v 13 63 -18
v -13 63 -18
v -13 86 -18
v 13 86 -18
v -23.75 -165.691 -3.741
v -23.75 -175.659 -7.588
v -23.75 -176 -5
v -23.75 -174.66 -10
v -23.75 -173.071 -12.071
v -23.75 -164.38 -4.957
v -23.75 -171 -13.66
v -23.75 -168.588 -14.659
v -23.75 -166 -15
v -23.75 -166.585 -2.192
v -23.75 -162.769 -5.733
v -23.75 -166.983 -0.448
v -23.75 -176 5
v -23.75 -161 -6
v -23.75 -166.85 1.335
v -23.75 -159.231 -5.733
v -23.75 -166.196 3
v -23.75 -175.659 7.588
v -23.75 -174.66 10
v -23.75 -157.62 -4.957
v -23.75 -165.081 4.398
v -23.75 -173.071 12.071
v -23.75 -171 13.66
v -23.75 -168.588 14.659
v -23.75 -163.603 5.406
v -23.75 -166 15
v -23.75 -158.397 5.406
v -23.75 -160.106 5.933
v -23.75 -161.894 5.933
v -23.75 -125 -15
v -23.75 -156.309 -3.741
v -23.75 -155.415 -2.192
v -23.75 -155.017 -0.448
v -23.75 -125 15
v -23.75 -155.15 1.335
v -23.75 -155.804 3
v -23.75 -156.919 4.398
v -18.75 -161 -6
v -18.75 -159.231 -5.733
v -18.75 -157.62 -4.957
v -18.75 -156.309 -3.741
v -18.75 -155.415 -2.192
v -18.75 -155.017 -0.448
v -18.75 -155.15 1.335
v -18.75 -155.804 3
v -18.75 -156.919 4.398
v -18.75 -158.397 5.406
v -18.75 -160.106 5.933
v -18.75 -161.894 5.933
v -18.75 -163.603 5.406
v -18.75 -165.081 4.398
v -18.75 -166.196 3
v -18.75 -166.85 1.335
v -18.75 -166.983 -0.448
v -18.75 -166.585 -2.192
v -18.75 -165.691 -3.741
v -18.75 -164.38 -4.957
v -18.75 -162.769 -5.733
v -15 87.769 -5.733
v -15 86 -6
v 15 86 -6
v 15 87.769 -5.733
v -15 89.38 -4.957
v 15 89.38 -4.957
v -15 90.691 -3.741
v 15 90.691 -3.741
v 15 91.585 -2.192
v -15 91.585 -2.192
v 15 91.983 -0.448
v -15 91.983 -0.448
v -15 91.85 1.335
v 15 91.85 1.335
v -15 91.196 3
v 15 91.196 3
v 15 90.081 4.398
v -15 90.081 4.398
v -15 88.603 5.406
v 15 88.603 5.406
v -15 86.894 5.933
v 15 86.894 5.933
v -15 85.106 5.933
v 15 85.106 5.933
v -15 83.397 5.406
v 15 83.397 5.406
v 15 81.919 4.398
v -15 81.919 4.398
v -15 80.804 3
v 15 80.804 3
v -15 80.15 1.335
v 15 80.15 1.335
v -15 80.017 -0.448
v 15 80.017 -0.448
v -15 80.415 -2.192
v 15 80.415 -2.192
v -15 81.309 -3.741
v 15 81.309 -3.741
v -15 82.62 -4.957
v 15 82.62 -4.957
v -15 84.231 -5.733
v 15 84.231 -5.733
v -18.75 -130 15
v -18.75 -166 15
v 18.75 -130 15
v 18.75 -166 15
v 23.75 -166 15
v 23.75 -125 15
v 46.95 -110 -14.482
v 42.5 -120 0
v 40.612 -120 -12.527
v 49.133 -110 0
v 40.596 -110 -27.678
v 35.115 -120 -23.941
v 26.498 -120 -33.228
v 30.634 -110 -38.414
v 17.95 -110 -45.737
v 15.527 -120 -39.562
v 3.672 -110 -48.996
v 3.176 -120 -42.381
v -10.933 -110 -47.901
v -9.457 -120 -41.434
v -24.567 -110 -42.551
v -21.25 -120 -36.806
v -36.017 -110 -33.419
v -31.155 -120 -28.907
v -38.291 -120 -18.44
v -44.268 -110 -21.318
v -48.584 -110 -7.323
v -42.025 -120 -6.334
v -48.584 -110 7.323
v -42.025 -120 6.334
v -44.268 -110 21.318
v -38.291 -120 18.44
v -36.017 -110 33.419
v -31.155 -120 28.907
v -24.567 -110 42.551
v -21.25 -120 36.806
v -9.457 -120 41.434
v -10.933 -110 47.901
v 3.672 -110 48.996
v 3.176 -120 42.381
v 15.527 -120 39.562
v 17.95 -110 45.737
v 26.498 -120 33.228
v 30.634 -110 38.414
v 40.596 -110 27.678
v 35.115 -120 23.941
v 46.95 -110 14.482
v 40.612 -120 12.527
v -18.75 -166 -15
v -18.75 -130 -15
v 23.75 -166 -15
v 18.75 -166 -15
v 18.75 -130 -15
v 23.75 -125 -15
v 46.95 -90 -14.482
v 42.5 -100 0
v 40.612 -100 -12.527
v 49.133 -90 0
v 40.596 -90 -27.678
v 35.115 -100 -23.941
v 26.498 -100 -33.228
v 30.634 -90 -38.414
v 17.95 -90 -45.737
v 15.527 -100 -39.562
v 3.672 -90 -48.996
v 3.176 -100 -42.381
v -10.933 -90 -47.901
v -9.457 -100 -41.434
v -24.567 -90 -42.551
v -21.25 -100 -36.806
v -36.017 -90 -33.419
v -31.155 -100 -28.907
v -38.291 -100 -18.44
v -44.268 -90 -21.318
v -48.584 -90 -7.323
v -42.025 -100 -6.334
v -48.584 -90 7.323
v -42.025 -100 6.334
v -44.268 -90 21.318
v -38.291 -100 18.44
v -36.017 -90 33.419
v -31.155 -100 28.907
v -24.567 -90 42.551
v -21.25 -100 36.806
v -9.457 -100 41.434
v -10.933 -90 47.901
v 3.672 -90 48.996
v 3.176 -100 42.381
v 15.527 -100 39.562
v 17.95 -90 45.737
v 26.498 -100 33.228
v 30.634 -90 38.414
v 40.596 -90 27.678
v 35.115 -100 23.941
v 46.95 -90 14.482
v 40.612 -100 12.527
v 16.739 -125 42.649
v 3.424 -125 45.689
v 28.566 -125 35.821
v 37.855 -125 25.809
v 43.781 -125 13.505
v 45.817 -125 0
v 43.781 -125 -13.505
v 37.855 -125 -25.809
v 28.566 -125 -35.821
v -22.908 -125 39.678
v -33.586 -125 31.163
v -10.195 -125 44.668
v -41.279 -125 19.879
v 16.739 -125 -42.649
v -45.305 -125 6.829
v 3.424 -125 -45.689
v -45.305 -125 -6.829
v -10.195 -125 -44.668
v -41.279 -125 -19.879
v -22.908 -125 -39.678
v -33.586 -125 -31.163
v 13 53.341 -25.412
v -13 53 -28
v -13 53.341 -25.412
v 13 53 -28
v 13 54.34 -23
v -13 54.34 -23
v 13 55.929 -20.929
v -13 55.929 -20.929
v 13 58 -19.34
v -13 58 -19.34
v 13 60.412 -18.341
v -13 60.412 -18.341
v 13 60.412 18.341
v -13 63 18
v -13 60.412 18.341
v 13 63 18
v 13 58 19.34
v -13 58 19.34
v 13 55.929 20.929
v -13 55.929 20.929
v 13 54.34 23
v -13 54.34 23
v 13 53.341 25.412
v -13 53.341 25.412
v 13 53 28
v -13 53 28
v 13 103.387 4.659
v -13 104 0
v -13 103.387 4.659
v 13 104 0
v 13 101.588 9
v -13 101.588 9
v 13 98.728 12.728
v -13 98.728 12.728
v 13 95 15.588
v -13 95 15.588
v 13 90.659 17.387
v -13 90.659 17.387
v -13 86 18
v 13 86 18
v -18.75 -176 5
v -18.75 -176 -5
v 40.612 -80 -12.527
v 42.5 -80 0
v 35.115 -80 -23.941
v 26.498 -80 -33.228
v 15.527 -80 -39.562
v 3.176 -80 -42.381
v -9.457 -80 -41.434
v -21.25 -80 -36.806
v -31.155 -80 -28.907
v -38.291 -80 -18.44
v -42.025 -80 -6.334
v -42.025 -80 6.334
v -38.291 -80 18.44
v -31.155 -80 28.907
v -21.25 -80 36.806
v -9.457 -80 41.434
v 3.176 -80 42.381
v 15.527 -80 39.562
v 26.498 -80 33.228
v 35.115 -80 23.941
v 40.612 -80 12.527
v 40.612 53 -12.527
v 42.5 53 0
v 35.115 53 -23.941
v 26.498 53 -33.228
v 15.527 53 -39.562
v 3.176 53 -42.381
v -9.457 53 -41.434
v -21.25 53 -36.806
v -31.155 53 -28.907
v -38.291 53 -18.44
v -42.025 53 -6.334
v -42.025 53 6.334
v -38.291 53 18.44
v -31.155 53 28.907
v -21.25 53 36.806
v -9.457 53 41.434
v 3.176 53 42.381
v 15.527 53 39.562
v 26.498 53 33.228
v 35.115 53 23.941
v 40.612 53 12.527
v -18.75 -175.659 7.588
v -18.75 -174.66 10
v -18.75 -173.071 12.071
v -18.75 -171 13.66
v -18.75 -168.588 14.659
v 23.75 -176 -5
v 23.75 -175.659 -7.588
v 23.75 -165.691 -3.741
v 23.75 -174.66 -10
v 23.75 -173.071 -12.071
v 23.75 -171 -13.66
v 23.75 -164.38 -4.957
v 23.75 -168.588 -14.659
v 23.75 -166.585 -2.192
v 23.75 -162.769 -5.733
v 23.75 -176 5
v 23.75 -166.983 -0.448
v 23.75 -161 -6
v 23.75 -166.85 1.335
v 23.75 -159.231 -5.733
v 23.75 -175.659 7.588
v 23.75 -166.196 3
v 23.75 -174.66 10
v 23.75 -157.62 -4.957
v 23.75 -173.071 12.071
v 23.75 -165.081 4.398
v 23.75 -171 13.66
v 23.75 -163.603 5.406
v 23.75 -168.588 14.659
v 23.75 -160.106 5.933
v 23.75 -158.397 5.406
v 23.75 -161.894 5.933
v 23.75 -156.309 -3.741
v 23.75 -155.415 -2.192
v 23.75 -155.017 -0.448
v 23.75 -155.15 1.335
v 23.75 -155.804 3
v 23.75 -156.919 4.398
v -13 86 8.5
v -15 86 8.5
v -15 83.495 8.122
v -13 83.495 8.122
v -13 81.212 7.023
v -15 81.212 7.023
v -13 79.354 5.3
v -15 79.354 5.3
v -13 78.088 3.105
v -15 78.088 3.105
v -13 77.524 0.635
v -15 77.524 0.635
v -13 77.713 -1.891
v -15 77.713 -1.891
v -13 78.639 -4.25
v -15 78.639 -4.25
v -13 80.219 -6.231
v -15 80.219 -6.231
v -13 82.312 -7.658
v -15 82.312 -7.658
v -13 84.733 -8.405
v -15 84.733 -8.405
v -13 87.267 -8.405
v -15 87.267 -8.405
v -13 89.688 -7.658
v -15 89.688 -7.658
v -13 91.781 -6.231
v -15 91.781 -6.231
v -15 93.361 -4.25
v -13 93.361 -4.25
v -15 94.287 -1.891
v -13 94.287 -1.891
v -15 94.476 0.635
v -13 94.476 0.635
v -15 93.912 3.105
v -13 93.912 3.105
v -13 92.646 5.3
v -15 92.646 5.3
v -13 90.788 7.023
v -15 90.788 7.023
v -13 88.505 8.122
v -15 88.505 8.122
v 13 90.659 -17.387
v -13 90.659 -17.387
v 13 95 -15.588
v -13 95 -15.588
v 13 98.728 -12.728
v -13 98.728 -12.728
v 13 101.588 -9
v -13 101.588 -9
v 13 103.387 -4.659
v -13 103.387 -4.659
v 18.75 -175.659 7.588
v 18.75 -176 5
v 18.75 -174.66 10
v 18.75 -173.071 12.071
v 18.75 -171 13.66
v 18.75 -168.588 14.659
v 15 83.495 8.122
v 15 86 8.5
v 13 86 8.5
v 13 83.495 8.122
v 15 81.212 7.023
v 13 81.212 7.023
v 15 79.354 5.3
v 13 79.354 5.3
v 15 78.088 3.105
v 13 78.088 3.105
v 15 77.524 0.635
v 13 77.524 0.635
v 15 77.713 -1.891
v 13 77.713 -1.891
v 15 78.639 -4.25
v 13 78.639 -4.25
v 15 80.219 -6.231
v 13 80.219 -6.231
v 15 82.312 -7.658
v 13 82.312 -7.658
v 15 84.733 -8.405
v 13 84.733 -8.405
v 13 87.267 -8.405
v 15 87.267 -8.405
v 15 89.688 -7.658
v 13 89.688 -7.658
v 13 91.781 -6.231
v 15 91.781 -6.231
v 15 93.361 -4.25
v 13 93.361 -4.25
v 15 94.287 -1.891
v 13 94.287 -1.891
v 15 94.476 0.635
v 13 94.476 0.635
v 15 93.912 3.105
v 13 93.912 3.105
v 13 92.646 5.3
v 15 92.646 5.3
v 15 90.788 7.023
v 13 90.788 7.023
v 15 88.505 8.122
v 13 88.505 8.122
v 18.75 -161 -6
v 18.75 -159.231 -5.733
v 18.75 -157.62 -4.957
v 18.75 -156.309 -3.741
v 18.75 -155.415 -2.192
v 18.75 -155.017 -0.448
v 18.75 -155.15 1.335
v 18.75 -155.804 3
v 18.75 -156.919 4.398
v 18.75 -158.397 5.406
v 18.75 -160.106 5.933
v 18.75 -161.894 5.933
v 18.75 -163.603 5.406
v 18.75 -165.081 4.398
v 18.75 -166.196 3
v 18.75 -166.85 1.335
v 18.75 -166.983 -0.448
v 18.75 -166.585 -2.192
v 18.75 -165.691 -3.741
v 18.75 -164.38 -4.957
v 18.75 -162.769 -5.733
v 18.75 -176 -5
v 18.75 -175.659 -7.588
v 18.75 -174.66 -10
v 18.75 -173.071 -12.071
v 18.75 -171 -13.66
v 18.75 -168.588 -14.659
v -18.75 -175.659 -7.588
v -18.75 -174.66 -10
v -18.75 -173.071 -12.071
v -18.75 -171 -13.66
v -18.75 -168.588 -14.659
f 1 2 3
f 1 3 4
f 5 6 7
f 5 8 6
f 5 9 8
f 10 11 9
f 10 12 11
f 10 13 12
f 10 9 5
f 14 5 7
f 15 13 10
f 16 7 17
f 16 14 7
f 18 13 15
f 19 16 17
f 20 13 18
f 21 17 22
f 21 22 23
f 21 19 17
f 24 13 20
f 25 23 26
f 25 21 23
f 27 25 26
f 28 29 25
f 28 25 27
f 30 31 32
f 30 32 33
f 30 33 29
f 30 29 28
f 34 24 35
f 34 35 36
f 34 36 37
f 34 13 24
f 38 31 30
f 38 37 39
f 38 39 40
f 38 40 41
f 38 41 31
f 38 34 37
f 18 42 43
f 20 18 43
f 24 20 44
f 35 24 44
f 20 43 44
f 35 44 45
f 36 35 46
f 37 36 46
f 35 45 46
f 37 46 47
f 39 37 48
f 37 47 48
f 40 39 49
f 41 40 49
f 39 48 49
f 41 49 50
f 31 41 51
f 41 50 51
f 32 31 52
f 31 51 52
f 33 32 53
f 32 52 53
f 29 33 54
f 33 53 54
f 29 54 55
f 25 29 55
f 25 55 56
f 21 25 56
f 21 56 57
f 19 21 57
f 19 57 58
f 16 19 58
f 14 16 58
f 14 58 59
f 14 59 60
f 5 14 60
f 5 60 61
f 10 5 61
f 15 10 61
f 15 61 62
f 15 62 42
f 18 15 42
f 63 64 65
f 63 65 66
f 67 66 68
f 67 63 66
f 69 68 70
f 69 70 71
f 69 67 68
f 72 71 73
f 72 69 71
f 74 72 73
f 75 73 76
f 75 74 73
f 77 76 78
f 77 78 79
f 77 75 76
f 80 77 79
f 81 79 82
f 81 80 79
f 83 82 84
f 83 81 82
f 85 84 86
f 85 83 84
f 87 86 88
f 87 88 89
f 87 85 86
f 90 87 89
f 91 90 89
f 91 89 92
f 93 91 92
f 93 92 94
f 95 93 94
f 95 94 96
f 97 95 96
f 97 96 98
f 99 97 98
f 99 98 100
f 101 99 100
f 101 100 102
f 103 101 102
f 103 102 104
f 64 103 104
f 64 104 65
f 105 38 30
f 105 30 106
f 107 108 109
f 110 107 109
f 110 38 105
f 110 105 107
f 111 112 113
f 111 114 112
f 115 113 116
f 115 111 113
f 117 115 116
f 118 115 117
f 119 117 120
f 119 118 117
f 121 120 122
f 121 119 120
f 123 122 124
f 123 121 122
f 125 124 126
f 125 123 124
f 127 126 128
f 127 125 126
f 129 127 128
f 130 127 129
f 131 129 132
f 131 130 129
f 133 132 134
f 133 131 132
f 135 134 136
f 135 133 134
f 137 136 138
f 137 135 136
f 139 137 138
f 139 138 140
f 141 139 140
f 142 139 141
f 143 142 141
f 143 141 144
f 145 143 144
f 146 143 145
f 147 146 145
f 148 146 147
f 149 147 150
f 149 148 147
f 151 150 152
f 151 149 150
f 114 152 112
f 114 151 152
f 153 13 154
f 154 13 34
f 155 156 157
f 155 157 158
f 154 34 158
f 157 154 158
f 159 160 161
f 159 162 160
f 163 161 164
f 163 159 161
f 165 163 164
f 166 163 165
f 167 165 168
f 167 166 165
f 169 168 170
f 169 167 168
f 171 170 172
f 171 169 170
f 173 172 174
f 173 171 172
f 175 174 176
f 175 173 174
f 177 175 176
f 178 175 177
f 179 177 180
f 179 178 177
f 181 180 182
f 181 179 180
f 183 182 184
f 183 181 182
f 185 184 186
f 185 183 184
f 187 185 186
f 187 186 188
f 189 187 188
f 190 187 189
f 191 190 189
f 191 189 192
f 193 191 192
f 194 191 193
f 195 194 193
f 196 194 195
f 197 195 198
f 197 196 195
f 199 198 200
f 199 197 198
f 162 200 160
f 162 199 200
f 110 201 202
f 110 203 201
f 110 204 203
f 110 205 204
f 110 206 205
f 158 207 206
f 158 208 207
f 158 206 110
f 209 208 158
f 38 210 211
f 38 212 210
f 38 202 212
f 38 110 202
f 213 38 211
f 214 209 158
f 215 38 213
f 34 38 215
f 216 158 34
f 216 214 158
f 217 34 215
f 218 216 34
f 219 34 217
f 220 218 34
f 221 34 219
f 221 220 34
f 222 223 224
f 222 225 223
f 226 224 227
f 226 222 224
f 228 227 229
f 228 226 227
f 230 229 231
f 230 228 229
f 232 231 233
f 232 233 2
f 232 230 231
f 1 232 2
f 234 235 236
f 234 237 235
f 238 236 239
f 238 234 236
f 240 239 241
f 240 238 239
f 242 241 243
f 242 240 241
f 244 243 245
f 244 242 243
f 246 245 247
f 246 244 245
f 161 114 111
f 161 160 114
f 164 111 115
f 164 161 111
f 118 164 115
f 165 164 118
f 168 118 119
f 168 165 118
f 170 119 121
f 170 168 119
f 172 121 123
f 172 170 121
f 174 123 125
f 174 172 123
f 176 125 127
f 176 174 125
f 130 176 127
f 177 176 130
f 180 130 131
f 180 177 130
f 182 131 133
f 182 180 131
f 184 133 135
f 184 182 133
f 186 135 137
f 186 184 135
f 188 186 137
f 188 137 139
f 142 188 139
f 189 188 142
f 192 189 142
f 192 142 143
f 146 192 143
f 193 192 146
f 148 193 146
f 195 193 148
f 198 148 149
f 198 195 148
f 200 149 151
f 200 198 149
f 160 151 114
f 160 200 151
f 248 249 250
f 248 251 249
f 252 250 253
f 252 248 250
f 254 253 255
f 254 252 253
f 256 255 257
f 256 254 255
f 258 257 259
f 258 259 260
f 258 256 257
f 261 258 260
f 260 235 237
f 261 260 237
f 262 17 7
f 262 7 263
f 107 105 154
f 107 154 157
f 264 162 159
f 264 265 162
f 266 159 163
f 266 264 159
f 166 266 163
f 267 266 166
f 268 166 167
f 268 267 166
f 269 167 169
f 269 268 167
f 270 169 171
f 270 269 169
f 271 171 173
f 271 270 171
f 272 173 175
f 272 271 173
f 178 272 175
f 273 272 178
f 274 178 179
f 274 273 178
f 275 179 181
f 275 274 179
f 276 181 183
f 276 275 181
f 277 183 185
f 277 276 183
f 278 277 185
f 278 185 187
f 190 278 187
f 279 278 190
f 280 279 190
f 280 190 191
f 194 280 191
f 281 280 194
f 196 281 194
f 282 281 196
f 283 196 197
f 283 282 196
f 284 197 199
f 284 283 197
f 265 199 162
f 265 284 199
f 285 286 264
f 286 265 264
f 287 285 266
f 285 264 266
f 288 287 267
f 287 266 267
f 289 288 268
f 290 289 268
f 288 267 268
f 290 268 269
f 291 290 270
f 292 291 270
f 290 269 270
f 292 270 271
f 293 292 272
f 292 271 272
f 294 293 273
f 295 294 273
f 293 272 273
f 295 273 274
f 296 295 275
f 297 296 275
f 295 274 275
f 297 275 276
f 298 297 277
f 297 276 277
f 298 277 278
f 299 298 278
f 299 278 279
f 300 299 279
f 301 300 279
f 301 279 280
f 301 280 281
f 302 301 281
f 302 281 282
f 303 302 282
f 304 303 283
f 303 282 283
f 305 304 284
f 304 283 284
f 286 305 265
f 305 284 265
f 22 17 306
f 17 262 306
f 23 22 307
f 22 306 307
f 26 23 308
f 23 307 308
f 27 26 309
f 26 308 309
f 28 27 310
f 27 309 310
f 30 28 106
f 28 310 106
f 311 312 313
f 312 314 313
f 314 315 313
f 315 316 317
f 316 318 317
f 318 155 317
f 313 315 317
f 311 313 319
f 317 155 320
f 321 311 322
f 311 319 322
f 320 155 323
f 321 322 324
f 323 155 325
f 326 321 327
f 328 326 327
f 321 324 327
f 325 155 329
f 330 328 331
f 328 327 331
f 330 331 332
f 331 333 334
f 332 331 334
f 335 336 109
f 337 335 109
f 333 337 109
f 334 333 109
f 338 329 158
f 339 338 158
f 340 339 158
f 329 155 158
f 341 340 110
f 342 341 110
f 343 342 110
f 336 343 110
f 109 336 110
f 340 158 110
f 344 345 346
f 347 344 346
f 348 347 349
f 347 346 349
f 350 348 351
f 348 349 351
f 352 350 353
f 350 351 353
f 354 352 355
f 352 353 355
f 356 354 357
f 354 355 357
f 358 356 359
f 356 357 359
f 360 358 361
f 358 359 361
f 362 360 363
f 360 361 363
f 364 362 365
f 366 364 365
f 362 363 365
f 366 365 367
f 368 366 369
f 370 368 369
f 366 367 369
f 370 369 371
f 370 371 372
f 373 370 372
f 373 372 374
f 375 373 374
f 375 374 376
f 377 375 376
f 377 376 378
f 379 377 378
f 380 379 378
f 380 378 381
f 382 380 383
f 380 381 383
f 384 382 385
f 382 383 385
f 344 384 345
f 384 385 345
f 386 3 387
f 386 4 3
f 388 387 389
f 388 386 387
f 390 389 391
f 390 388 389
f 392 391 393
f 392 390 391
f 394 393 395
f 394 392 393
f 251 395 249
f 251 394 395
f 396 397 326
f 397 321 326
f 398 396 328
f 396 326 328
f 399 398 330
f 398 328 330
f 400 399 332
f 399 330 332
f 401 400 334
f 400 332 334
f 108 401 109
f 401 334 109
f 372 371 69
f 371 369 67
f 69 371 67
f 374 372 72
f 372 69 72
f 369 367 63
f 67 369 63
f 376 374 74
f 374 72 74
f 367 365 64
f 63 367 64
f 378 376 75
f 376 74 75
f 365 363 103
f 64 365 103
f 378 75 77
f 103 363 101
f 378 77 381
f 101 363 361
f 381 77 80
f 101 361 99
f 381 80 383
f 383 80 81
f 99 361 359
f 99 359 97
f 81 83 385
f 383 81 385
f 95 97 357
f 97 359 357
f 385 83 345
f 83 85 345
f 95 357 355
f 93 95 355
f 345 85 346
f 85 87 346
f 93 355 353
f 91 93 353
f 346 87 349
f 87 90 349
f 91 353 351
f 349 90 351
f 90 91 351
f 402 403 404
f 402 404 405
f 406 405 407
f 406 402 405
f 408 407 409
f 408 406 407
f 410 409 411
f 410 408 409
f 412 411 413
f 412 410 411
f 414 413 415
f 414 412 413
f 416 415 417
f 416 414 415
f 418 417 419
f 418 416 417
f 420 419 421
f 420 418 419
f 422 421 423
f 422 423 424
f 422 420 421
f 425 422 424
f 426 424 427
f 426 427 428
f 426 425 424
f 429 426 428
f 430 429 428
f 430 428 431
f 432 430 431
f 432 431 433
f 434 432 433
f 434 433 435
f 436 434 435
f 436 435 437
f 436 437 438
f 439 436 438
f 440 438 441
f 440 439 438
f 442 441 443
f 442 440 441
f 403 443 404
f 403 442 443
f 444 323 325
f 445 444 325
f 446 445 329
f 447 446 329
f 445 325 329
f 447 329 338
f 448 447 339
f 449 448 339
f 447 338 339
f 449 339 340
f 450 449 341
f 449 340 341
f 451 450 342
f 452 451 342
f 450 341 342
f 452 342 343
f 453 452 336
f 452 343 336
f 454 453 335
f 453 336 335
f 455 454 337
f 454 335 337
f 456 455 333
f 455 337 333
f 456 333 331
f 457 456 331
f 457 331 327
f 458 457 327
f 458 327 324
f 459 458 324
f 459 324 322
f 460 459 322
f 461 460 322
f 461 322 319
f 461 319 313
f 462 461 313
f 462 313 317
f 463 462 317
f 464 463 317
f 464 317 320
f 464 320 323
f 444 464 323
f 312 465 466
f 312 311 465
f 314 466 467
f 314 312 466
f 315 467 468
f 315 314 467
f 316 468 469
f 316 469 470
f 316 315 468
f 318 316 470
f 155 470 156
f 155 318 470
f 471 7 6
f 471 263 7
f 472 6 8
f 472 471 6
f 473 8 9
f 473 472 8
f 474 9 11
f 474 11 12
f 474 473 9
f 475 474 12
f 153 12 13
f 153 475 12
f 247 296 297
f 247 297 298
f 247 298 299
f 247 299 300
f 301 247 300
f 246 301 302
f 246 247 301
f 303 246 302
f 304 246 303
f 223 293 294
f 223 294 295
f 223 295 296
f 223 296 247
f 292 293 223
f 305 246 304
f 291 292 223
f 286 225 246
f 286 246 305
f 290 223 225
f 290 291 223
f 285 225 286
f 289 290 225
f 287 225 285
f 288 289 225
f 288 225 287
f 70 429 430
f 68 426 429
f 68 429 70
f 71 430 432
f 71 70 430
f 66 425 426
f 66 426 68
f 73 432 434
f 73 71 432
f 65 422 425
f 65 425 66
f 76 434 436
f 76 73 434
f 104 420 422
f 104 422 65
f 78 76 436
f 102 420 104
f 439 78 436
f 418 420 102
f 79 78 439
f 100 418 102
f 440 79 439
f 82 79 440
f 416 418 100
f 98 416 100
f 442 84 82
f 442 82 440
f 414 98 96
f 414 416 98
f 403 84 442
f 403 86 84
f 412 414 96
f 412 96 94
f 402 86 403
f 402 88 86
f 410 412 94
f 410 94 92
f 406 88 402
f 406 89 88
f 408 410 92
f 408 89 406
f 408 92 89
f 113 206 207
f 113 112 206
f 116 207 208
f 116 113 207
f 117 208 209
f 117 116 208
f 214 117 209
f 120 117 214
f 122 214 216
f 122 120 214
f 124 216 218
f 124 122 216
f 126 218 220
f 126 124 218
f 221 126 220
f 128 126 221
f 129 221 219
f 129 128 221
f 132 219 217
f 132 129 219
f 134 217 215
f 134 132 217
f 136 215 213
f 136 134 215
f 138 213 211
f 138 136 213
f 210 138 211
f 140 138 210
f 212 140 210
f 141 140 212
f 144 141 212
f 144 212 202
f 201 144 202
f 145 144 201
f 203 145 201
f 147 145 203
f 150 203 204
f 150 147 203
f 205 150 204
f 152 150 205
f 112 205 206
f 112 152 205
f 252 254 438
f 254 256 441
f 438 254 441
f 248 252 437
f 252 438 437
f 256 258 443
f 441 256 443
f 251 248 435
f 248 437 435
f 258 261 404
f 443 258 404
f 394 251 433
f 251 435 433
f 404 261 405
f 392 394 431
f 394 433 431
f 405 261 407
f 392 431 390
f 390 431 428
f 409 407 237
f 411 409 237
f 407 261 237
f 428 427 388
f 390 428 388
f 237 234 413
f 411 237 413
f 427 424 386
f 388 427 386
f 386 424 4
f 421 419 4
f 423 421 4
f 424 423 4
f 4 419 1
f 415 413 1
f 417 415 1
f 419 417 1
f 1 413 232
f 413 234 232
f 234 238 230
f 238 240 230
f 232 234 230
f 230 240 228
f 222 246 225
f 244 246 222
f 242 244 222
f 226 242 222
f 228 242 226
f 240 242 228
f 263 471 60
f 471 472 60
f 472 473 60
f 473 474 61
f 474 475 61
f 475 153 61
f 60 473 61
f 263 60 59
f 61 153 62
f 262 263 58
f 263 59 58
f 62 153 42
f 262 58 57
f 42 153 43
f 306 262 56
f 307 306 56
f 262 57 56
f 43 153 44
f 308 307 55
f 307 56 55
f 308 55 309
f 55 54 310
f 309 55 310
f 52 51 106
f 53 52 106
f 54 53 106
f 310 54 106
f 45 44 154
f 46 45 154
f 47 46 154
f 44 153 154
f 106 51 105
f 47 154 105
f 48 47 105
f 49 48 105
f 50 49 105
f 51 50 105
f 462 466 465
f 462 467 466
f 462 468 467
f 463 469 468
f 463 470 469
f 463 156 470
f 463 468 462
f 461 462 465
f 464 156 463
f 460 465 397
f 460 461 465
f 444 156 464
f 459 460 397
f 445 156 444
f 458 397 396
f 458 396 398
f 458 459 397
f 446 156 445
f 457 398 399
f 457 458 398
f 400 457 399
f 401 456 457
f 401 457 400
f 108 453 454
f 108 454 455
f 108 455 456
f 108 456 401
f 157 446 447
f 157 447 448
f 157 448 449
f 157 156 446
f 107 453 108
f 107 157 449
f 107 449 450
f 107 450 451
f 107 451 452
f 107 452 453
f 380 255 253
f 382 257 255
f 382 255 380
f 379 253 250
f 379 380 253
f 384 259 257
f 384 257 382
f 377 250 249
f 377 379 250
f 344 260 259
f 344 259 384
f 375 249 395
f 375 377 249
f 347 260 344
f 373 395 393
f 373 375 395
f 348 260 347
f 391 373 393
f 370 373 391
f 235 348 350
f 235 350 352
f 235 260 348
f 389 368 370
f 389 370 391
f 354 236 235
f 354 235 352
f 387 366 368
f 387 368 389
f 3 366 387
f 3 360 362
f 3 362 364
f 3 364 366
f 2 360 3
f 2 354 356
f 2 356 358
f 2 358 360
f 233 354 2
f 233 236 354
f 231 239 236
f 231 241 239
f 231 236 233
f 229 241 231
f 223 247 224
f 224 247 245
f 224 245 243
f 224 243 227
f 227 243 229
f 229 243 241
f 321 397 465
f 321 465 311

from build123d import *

# Parameters (mm, degrees)
SZKIC2_W                    = 26
SZKIC2_H                    = 36
DODANIE_WYCI_GNI_CIE1_DEPTH = 51
SZKIC3_W                    = 47.5
SZKIC3_H                    = 30
DODANIE_WYCI_GNI_CIE2_DEPTH = 5
SZKIC4_W                    = 5
SZKIC4_H                    = 30
DODANIE_WYCI_GNI_CIE3_DEPTH = 46
SZKIC5_R                    = 6
WYTNIJ_WYCI_GNI_CIE1_DEPTH  = 197.7283515
SZKIC6_R                    = 6
WYTNIJ_WYCI_GNI_CIE2_DEPTH  = 46
DODANIE_WYCI_GNI_CIE4_START = 2
SZKIC8_R                    = 8.5
SZKIC8_R_2                  = 6
DODANIE_WYCI_GNI_CIE4_DEPTH = 2
ZAOKR_GLENIE1_R             = 18
ZAOKR_GLENIE2_R             = 10
ZAOKR_GLENIE3_R             = 10


with BuildPart() as part:
    # Szkic1 → Obrót1 (revolve)
    with BuildSketch(Plane.XY, mode=Mode.PRIVATE) as obr_t1_sk:
        Polygon((-42.5, 0), (-42.5, 53), (0, 53), (0, -125), (-45.81662479, -125), (-42.5, -120), (-49.133249581, -110), (-42.5, -100), (-49.133249581, -90), (-42.5, -80), align=None)
    revolve(obr_t1_sk.sketch.rotate(Axis((0, -125, 0), (0, 1, 0)), 180), axis=Axis((0, -125, 0), (0, 1, 0)))

    # Szkic2 → Dodanie-wyciągnięcie1 (add)
    with BuildSketch(Plane(origin=(0, 53, 0), x_dir=(1, 0, 0), z_dir=(0, 1, 0))):
        Rectangle(SZKIC2_W, SZKIC2_H)
    extrude(amount=DODANIE_WYCI_GNI_CIE1_DEPTH)

    # Szkic3 → Dodanie-wyciągnięcie2 (add)
    with BuildSketch(Plane.XZ.offset(125)):
        Rectangle(SZKIC3_W, SZKIC3_H)
    extrude(amount=DODANIE_WYCI_GNI_CIE2_DEPTH)

    # Szkic4 → Dodanie-wyciągnięcie3 (add)
    with BuildSketch(Plane.XZ.offset(130)):
        with Locations((-21.25, 0)):
            Rectangle(SZKIC4_W, SZKIC4_H)
        with Locations((21.25, 0)):
            Rectangle(SZKIC4_W, SZKIC4_H)
    extrude(amount=DODANIE_WYCI_GNI_CIE3_DEPTH)

    # Szkic5 → Wytnij-wyciągnięcie1 (cut, through all)
    with BuildSketch(Plane(origin=(23.75, 0, 0), x_dir=(0, 0, -1), z_dir=(1, 0, 0))):
        with Locations((0, -161)):
            Circle(SZKIC5_R)
    extrude(amount=-WYTNIJ_WYCI_GNI_CIE1_DEPTH, mode=Mode.SUBTRACT)

    # Szkic6 → Wytnij-wyciągnięcie2 (cut)
    with BuildSketch(Plane(origin=(13, 0, 0), x_dir=(0, 0, -1), z_dir=(1, 0, 0))):
        with Locations((0, 86)):
            Circle(SZKIC6_R)
    extrude(amount=-WYTNIJ_WYCI_GNI_CIE2_DEPTH, mode=Mode.SUBTRACT)

    # Szkic8 → Dodanie-wyciągnięcie4 (add)
    with BuildSketch(Plane(origin=(13, 0, 0), x_dir=(0, 0, -1), z_dir=(1, 0, 0)).offset(DODANIE_WYCI_GNI_CIE4_START)):
        with Locations(Location((0, 86, 0), (0, 0, 180))):
            Circle(SZKIC8_R)
        with Locations((0, 86)):
            Circle(SZKIC8_R_2, mode=Mode.SUBTRACT)
    dodanie_wyci_gni_cie4 = extrude(amount=-DODANIE_WYCI_GNI_CIE4_DEPTH)

    # Lustro1: Dodanie-wyciągnięcie4 across plane
    add(dodanie_wyci_gni_cie4.mirror(Plane(origin=(0, 0, 0), x_dir=(0, 0, 1), z_dir=(1, 0, 0))))

    # Zaokrąglenie1
    zaokr_glenie1_edges = [part.edges().sort_by_distance(p)[0] for p in [
        (0, 104, 18),
        (0, 104, -18),
    ]]
    fillet(zaokr_glenie1_edges, radius=ZAOKR_GLENIE1_R - 0.0001)  # a hair under: the kernel refuses the full size

    # Zaokrąglenie2
    zaokr_glenie2_edges = [part.edges().sort_by_distance(p)[0] for p in [
        (0, 53, -18),
        (0, 53, 18),
    ]]
    fillet(zaokr_glenie2_edges, radius=ZAOKR_GLENIE2_R)

    # Zaokrąglenie3
    zaokr_glenie3_edges = [part.edges().sort_by_distance(p)[0] for p in [
        (-21.25, -176, -15),
        (-21.25, -176, 15),
        (21.25, -176, 15),
        (21.25, -176, -15),
    ]]
    fillet(zaokr_glenie3_edges, radius=ZAOKR_GLENIE3_R)


solid = part.part
